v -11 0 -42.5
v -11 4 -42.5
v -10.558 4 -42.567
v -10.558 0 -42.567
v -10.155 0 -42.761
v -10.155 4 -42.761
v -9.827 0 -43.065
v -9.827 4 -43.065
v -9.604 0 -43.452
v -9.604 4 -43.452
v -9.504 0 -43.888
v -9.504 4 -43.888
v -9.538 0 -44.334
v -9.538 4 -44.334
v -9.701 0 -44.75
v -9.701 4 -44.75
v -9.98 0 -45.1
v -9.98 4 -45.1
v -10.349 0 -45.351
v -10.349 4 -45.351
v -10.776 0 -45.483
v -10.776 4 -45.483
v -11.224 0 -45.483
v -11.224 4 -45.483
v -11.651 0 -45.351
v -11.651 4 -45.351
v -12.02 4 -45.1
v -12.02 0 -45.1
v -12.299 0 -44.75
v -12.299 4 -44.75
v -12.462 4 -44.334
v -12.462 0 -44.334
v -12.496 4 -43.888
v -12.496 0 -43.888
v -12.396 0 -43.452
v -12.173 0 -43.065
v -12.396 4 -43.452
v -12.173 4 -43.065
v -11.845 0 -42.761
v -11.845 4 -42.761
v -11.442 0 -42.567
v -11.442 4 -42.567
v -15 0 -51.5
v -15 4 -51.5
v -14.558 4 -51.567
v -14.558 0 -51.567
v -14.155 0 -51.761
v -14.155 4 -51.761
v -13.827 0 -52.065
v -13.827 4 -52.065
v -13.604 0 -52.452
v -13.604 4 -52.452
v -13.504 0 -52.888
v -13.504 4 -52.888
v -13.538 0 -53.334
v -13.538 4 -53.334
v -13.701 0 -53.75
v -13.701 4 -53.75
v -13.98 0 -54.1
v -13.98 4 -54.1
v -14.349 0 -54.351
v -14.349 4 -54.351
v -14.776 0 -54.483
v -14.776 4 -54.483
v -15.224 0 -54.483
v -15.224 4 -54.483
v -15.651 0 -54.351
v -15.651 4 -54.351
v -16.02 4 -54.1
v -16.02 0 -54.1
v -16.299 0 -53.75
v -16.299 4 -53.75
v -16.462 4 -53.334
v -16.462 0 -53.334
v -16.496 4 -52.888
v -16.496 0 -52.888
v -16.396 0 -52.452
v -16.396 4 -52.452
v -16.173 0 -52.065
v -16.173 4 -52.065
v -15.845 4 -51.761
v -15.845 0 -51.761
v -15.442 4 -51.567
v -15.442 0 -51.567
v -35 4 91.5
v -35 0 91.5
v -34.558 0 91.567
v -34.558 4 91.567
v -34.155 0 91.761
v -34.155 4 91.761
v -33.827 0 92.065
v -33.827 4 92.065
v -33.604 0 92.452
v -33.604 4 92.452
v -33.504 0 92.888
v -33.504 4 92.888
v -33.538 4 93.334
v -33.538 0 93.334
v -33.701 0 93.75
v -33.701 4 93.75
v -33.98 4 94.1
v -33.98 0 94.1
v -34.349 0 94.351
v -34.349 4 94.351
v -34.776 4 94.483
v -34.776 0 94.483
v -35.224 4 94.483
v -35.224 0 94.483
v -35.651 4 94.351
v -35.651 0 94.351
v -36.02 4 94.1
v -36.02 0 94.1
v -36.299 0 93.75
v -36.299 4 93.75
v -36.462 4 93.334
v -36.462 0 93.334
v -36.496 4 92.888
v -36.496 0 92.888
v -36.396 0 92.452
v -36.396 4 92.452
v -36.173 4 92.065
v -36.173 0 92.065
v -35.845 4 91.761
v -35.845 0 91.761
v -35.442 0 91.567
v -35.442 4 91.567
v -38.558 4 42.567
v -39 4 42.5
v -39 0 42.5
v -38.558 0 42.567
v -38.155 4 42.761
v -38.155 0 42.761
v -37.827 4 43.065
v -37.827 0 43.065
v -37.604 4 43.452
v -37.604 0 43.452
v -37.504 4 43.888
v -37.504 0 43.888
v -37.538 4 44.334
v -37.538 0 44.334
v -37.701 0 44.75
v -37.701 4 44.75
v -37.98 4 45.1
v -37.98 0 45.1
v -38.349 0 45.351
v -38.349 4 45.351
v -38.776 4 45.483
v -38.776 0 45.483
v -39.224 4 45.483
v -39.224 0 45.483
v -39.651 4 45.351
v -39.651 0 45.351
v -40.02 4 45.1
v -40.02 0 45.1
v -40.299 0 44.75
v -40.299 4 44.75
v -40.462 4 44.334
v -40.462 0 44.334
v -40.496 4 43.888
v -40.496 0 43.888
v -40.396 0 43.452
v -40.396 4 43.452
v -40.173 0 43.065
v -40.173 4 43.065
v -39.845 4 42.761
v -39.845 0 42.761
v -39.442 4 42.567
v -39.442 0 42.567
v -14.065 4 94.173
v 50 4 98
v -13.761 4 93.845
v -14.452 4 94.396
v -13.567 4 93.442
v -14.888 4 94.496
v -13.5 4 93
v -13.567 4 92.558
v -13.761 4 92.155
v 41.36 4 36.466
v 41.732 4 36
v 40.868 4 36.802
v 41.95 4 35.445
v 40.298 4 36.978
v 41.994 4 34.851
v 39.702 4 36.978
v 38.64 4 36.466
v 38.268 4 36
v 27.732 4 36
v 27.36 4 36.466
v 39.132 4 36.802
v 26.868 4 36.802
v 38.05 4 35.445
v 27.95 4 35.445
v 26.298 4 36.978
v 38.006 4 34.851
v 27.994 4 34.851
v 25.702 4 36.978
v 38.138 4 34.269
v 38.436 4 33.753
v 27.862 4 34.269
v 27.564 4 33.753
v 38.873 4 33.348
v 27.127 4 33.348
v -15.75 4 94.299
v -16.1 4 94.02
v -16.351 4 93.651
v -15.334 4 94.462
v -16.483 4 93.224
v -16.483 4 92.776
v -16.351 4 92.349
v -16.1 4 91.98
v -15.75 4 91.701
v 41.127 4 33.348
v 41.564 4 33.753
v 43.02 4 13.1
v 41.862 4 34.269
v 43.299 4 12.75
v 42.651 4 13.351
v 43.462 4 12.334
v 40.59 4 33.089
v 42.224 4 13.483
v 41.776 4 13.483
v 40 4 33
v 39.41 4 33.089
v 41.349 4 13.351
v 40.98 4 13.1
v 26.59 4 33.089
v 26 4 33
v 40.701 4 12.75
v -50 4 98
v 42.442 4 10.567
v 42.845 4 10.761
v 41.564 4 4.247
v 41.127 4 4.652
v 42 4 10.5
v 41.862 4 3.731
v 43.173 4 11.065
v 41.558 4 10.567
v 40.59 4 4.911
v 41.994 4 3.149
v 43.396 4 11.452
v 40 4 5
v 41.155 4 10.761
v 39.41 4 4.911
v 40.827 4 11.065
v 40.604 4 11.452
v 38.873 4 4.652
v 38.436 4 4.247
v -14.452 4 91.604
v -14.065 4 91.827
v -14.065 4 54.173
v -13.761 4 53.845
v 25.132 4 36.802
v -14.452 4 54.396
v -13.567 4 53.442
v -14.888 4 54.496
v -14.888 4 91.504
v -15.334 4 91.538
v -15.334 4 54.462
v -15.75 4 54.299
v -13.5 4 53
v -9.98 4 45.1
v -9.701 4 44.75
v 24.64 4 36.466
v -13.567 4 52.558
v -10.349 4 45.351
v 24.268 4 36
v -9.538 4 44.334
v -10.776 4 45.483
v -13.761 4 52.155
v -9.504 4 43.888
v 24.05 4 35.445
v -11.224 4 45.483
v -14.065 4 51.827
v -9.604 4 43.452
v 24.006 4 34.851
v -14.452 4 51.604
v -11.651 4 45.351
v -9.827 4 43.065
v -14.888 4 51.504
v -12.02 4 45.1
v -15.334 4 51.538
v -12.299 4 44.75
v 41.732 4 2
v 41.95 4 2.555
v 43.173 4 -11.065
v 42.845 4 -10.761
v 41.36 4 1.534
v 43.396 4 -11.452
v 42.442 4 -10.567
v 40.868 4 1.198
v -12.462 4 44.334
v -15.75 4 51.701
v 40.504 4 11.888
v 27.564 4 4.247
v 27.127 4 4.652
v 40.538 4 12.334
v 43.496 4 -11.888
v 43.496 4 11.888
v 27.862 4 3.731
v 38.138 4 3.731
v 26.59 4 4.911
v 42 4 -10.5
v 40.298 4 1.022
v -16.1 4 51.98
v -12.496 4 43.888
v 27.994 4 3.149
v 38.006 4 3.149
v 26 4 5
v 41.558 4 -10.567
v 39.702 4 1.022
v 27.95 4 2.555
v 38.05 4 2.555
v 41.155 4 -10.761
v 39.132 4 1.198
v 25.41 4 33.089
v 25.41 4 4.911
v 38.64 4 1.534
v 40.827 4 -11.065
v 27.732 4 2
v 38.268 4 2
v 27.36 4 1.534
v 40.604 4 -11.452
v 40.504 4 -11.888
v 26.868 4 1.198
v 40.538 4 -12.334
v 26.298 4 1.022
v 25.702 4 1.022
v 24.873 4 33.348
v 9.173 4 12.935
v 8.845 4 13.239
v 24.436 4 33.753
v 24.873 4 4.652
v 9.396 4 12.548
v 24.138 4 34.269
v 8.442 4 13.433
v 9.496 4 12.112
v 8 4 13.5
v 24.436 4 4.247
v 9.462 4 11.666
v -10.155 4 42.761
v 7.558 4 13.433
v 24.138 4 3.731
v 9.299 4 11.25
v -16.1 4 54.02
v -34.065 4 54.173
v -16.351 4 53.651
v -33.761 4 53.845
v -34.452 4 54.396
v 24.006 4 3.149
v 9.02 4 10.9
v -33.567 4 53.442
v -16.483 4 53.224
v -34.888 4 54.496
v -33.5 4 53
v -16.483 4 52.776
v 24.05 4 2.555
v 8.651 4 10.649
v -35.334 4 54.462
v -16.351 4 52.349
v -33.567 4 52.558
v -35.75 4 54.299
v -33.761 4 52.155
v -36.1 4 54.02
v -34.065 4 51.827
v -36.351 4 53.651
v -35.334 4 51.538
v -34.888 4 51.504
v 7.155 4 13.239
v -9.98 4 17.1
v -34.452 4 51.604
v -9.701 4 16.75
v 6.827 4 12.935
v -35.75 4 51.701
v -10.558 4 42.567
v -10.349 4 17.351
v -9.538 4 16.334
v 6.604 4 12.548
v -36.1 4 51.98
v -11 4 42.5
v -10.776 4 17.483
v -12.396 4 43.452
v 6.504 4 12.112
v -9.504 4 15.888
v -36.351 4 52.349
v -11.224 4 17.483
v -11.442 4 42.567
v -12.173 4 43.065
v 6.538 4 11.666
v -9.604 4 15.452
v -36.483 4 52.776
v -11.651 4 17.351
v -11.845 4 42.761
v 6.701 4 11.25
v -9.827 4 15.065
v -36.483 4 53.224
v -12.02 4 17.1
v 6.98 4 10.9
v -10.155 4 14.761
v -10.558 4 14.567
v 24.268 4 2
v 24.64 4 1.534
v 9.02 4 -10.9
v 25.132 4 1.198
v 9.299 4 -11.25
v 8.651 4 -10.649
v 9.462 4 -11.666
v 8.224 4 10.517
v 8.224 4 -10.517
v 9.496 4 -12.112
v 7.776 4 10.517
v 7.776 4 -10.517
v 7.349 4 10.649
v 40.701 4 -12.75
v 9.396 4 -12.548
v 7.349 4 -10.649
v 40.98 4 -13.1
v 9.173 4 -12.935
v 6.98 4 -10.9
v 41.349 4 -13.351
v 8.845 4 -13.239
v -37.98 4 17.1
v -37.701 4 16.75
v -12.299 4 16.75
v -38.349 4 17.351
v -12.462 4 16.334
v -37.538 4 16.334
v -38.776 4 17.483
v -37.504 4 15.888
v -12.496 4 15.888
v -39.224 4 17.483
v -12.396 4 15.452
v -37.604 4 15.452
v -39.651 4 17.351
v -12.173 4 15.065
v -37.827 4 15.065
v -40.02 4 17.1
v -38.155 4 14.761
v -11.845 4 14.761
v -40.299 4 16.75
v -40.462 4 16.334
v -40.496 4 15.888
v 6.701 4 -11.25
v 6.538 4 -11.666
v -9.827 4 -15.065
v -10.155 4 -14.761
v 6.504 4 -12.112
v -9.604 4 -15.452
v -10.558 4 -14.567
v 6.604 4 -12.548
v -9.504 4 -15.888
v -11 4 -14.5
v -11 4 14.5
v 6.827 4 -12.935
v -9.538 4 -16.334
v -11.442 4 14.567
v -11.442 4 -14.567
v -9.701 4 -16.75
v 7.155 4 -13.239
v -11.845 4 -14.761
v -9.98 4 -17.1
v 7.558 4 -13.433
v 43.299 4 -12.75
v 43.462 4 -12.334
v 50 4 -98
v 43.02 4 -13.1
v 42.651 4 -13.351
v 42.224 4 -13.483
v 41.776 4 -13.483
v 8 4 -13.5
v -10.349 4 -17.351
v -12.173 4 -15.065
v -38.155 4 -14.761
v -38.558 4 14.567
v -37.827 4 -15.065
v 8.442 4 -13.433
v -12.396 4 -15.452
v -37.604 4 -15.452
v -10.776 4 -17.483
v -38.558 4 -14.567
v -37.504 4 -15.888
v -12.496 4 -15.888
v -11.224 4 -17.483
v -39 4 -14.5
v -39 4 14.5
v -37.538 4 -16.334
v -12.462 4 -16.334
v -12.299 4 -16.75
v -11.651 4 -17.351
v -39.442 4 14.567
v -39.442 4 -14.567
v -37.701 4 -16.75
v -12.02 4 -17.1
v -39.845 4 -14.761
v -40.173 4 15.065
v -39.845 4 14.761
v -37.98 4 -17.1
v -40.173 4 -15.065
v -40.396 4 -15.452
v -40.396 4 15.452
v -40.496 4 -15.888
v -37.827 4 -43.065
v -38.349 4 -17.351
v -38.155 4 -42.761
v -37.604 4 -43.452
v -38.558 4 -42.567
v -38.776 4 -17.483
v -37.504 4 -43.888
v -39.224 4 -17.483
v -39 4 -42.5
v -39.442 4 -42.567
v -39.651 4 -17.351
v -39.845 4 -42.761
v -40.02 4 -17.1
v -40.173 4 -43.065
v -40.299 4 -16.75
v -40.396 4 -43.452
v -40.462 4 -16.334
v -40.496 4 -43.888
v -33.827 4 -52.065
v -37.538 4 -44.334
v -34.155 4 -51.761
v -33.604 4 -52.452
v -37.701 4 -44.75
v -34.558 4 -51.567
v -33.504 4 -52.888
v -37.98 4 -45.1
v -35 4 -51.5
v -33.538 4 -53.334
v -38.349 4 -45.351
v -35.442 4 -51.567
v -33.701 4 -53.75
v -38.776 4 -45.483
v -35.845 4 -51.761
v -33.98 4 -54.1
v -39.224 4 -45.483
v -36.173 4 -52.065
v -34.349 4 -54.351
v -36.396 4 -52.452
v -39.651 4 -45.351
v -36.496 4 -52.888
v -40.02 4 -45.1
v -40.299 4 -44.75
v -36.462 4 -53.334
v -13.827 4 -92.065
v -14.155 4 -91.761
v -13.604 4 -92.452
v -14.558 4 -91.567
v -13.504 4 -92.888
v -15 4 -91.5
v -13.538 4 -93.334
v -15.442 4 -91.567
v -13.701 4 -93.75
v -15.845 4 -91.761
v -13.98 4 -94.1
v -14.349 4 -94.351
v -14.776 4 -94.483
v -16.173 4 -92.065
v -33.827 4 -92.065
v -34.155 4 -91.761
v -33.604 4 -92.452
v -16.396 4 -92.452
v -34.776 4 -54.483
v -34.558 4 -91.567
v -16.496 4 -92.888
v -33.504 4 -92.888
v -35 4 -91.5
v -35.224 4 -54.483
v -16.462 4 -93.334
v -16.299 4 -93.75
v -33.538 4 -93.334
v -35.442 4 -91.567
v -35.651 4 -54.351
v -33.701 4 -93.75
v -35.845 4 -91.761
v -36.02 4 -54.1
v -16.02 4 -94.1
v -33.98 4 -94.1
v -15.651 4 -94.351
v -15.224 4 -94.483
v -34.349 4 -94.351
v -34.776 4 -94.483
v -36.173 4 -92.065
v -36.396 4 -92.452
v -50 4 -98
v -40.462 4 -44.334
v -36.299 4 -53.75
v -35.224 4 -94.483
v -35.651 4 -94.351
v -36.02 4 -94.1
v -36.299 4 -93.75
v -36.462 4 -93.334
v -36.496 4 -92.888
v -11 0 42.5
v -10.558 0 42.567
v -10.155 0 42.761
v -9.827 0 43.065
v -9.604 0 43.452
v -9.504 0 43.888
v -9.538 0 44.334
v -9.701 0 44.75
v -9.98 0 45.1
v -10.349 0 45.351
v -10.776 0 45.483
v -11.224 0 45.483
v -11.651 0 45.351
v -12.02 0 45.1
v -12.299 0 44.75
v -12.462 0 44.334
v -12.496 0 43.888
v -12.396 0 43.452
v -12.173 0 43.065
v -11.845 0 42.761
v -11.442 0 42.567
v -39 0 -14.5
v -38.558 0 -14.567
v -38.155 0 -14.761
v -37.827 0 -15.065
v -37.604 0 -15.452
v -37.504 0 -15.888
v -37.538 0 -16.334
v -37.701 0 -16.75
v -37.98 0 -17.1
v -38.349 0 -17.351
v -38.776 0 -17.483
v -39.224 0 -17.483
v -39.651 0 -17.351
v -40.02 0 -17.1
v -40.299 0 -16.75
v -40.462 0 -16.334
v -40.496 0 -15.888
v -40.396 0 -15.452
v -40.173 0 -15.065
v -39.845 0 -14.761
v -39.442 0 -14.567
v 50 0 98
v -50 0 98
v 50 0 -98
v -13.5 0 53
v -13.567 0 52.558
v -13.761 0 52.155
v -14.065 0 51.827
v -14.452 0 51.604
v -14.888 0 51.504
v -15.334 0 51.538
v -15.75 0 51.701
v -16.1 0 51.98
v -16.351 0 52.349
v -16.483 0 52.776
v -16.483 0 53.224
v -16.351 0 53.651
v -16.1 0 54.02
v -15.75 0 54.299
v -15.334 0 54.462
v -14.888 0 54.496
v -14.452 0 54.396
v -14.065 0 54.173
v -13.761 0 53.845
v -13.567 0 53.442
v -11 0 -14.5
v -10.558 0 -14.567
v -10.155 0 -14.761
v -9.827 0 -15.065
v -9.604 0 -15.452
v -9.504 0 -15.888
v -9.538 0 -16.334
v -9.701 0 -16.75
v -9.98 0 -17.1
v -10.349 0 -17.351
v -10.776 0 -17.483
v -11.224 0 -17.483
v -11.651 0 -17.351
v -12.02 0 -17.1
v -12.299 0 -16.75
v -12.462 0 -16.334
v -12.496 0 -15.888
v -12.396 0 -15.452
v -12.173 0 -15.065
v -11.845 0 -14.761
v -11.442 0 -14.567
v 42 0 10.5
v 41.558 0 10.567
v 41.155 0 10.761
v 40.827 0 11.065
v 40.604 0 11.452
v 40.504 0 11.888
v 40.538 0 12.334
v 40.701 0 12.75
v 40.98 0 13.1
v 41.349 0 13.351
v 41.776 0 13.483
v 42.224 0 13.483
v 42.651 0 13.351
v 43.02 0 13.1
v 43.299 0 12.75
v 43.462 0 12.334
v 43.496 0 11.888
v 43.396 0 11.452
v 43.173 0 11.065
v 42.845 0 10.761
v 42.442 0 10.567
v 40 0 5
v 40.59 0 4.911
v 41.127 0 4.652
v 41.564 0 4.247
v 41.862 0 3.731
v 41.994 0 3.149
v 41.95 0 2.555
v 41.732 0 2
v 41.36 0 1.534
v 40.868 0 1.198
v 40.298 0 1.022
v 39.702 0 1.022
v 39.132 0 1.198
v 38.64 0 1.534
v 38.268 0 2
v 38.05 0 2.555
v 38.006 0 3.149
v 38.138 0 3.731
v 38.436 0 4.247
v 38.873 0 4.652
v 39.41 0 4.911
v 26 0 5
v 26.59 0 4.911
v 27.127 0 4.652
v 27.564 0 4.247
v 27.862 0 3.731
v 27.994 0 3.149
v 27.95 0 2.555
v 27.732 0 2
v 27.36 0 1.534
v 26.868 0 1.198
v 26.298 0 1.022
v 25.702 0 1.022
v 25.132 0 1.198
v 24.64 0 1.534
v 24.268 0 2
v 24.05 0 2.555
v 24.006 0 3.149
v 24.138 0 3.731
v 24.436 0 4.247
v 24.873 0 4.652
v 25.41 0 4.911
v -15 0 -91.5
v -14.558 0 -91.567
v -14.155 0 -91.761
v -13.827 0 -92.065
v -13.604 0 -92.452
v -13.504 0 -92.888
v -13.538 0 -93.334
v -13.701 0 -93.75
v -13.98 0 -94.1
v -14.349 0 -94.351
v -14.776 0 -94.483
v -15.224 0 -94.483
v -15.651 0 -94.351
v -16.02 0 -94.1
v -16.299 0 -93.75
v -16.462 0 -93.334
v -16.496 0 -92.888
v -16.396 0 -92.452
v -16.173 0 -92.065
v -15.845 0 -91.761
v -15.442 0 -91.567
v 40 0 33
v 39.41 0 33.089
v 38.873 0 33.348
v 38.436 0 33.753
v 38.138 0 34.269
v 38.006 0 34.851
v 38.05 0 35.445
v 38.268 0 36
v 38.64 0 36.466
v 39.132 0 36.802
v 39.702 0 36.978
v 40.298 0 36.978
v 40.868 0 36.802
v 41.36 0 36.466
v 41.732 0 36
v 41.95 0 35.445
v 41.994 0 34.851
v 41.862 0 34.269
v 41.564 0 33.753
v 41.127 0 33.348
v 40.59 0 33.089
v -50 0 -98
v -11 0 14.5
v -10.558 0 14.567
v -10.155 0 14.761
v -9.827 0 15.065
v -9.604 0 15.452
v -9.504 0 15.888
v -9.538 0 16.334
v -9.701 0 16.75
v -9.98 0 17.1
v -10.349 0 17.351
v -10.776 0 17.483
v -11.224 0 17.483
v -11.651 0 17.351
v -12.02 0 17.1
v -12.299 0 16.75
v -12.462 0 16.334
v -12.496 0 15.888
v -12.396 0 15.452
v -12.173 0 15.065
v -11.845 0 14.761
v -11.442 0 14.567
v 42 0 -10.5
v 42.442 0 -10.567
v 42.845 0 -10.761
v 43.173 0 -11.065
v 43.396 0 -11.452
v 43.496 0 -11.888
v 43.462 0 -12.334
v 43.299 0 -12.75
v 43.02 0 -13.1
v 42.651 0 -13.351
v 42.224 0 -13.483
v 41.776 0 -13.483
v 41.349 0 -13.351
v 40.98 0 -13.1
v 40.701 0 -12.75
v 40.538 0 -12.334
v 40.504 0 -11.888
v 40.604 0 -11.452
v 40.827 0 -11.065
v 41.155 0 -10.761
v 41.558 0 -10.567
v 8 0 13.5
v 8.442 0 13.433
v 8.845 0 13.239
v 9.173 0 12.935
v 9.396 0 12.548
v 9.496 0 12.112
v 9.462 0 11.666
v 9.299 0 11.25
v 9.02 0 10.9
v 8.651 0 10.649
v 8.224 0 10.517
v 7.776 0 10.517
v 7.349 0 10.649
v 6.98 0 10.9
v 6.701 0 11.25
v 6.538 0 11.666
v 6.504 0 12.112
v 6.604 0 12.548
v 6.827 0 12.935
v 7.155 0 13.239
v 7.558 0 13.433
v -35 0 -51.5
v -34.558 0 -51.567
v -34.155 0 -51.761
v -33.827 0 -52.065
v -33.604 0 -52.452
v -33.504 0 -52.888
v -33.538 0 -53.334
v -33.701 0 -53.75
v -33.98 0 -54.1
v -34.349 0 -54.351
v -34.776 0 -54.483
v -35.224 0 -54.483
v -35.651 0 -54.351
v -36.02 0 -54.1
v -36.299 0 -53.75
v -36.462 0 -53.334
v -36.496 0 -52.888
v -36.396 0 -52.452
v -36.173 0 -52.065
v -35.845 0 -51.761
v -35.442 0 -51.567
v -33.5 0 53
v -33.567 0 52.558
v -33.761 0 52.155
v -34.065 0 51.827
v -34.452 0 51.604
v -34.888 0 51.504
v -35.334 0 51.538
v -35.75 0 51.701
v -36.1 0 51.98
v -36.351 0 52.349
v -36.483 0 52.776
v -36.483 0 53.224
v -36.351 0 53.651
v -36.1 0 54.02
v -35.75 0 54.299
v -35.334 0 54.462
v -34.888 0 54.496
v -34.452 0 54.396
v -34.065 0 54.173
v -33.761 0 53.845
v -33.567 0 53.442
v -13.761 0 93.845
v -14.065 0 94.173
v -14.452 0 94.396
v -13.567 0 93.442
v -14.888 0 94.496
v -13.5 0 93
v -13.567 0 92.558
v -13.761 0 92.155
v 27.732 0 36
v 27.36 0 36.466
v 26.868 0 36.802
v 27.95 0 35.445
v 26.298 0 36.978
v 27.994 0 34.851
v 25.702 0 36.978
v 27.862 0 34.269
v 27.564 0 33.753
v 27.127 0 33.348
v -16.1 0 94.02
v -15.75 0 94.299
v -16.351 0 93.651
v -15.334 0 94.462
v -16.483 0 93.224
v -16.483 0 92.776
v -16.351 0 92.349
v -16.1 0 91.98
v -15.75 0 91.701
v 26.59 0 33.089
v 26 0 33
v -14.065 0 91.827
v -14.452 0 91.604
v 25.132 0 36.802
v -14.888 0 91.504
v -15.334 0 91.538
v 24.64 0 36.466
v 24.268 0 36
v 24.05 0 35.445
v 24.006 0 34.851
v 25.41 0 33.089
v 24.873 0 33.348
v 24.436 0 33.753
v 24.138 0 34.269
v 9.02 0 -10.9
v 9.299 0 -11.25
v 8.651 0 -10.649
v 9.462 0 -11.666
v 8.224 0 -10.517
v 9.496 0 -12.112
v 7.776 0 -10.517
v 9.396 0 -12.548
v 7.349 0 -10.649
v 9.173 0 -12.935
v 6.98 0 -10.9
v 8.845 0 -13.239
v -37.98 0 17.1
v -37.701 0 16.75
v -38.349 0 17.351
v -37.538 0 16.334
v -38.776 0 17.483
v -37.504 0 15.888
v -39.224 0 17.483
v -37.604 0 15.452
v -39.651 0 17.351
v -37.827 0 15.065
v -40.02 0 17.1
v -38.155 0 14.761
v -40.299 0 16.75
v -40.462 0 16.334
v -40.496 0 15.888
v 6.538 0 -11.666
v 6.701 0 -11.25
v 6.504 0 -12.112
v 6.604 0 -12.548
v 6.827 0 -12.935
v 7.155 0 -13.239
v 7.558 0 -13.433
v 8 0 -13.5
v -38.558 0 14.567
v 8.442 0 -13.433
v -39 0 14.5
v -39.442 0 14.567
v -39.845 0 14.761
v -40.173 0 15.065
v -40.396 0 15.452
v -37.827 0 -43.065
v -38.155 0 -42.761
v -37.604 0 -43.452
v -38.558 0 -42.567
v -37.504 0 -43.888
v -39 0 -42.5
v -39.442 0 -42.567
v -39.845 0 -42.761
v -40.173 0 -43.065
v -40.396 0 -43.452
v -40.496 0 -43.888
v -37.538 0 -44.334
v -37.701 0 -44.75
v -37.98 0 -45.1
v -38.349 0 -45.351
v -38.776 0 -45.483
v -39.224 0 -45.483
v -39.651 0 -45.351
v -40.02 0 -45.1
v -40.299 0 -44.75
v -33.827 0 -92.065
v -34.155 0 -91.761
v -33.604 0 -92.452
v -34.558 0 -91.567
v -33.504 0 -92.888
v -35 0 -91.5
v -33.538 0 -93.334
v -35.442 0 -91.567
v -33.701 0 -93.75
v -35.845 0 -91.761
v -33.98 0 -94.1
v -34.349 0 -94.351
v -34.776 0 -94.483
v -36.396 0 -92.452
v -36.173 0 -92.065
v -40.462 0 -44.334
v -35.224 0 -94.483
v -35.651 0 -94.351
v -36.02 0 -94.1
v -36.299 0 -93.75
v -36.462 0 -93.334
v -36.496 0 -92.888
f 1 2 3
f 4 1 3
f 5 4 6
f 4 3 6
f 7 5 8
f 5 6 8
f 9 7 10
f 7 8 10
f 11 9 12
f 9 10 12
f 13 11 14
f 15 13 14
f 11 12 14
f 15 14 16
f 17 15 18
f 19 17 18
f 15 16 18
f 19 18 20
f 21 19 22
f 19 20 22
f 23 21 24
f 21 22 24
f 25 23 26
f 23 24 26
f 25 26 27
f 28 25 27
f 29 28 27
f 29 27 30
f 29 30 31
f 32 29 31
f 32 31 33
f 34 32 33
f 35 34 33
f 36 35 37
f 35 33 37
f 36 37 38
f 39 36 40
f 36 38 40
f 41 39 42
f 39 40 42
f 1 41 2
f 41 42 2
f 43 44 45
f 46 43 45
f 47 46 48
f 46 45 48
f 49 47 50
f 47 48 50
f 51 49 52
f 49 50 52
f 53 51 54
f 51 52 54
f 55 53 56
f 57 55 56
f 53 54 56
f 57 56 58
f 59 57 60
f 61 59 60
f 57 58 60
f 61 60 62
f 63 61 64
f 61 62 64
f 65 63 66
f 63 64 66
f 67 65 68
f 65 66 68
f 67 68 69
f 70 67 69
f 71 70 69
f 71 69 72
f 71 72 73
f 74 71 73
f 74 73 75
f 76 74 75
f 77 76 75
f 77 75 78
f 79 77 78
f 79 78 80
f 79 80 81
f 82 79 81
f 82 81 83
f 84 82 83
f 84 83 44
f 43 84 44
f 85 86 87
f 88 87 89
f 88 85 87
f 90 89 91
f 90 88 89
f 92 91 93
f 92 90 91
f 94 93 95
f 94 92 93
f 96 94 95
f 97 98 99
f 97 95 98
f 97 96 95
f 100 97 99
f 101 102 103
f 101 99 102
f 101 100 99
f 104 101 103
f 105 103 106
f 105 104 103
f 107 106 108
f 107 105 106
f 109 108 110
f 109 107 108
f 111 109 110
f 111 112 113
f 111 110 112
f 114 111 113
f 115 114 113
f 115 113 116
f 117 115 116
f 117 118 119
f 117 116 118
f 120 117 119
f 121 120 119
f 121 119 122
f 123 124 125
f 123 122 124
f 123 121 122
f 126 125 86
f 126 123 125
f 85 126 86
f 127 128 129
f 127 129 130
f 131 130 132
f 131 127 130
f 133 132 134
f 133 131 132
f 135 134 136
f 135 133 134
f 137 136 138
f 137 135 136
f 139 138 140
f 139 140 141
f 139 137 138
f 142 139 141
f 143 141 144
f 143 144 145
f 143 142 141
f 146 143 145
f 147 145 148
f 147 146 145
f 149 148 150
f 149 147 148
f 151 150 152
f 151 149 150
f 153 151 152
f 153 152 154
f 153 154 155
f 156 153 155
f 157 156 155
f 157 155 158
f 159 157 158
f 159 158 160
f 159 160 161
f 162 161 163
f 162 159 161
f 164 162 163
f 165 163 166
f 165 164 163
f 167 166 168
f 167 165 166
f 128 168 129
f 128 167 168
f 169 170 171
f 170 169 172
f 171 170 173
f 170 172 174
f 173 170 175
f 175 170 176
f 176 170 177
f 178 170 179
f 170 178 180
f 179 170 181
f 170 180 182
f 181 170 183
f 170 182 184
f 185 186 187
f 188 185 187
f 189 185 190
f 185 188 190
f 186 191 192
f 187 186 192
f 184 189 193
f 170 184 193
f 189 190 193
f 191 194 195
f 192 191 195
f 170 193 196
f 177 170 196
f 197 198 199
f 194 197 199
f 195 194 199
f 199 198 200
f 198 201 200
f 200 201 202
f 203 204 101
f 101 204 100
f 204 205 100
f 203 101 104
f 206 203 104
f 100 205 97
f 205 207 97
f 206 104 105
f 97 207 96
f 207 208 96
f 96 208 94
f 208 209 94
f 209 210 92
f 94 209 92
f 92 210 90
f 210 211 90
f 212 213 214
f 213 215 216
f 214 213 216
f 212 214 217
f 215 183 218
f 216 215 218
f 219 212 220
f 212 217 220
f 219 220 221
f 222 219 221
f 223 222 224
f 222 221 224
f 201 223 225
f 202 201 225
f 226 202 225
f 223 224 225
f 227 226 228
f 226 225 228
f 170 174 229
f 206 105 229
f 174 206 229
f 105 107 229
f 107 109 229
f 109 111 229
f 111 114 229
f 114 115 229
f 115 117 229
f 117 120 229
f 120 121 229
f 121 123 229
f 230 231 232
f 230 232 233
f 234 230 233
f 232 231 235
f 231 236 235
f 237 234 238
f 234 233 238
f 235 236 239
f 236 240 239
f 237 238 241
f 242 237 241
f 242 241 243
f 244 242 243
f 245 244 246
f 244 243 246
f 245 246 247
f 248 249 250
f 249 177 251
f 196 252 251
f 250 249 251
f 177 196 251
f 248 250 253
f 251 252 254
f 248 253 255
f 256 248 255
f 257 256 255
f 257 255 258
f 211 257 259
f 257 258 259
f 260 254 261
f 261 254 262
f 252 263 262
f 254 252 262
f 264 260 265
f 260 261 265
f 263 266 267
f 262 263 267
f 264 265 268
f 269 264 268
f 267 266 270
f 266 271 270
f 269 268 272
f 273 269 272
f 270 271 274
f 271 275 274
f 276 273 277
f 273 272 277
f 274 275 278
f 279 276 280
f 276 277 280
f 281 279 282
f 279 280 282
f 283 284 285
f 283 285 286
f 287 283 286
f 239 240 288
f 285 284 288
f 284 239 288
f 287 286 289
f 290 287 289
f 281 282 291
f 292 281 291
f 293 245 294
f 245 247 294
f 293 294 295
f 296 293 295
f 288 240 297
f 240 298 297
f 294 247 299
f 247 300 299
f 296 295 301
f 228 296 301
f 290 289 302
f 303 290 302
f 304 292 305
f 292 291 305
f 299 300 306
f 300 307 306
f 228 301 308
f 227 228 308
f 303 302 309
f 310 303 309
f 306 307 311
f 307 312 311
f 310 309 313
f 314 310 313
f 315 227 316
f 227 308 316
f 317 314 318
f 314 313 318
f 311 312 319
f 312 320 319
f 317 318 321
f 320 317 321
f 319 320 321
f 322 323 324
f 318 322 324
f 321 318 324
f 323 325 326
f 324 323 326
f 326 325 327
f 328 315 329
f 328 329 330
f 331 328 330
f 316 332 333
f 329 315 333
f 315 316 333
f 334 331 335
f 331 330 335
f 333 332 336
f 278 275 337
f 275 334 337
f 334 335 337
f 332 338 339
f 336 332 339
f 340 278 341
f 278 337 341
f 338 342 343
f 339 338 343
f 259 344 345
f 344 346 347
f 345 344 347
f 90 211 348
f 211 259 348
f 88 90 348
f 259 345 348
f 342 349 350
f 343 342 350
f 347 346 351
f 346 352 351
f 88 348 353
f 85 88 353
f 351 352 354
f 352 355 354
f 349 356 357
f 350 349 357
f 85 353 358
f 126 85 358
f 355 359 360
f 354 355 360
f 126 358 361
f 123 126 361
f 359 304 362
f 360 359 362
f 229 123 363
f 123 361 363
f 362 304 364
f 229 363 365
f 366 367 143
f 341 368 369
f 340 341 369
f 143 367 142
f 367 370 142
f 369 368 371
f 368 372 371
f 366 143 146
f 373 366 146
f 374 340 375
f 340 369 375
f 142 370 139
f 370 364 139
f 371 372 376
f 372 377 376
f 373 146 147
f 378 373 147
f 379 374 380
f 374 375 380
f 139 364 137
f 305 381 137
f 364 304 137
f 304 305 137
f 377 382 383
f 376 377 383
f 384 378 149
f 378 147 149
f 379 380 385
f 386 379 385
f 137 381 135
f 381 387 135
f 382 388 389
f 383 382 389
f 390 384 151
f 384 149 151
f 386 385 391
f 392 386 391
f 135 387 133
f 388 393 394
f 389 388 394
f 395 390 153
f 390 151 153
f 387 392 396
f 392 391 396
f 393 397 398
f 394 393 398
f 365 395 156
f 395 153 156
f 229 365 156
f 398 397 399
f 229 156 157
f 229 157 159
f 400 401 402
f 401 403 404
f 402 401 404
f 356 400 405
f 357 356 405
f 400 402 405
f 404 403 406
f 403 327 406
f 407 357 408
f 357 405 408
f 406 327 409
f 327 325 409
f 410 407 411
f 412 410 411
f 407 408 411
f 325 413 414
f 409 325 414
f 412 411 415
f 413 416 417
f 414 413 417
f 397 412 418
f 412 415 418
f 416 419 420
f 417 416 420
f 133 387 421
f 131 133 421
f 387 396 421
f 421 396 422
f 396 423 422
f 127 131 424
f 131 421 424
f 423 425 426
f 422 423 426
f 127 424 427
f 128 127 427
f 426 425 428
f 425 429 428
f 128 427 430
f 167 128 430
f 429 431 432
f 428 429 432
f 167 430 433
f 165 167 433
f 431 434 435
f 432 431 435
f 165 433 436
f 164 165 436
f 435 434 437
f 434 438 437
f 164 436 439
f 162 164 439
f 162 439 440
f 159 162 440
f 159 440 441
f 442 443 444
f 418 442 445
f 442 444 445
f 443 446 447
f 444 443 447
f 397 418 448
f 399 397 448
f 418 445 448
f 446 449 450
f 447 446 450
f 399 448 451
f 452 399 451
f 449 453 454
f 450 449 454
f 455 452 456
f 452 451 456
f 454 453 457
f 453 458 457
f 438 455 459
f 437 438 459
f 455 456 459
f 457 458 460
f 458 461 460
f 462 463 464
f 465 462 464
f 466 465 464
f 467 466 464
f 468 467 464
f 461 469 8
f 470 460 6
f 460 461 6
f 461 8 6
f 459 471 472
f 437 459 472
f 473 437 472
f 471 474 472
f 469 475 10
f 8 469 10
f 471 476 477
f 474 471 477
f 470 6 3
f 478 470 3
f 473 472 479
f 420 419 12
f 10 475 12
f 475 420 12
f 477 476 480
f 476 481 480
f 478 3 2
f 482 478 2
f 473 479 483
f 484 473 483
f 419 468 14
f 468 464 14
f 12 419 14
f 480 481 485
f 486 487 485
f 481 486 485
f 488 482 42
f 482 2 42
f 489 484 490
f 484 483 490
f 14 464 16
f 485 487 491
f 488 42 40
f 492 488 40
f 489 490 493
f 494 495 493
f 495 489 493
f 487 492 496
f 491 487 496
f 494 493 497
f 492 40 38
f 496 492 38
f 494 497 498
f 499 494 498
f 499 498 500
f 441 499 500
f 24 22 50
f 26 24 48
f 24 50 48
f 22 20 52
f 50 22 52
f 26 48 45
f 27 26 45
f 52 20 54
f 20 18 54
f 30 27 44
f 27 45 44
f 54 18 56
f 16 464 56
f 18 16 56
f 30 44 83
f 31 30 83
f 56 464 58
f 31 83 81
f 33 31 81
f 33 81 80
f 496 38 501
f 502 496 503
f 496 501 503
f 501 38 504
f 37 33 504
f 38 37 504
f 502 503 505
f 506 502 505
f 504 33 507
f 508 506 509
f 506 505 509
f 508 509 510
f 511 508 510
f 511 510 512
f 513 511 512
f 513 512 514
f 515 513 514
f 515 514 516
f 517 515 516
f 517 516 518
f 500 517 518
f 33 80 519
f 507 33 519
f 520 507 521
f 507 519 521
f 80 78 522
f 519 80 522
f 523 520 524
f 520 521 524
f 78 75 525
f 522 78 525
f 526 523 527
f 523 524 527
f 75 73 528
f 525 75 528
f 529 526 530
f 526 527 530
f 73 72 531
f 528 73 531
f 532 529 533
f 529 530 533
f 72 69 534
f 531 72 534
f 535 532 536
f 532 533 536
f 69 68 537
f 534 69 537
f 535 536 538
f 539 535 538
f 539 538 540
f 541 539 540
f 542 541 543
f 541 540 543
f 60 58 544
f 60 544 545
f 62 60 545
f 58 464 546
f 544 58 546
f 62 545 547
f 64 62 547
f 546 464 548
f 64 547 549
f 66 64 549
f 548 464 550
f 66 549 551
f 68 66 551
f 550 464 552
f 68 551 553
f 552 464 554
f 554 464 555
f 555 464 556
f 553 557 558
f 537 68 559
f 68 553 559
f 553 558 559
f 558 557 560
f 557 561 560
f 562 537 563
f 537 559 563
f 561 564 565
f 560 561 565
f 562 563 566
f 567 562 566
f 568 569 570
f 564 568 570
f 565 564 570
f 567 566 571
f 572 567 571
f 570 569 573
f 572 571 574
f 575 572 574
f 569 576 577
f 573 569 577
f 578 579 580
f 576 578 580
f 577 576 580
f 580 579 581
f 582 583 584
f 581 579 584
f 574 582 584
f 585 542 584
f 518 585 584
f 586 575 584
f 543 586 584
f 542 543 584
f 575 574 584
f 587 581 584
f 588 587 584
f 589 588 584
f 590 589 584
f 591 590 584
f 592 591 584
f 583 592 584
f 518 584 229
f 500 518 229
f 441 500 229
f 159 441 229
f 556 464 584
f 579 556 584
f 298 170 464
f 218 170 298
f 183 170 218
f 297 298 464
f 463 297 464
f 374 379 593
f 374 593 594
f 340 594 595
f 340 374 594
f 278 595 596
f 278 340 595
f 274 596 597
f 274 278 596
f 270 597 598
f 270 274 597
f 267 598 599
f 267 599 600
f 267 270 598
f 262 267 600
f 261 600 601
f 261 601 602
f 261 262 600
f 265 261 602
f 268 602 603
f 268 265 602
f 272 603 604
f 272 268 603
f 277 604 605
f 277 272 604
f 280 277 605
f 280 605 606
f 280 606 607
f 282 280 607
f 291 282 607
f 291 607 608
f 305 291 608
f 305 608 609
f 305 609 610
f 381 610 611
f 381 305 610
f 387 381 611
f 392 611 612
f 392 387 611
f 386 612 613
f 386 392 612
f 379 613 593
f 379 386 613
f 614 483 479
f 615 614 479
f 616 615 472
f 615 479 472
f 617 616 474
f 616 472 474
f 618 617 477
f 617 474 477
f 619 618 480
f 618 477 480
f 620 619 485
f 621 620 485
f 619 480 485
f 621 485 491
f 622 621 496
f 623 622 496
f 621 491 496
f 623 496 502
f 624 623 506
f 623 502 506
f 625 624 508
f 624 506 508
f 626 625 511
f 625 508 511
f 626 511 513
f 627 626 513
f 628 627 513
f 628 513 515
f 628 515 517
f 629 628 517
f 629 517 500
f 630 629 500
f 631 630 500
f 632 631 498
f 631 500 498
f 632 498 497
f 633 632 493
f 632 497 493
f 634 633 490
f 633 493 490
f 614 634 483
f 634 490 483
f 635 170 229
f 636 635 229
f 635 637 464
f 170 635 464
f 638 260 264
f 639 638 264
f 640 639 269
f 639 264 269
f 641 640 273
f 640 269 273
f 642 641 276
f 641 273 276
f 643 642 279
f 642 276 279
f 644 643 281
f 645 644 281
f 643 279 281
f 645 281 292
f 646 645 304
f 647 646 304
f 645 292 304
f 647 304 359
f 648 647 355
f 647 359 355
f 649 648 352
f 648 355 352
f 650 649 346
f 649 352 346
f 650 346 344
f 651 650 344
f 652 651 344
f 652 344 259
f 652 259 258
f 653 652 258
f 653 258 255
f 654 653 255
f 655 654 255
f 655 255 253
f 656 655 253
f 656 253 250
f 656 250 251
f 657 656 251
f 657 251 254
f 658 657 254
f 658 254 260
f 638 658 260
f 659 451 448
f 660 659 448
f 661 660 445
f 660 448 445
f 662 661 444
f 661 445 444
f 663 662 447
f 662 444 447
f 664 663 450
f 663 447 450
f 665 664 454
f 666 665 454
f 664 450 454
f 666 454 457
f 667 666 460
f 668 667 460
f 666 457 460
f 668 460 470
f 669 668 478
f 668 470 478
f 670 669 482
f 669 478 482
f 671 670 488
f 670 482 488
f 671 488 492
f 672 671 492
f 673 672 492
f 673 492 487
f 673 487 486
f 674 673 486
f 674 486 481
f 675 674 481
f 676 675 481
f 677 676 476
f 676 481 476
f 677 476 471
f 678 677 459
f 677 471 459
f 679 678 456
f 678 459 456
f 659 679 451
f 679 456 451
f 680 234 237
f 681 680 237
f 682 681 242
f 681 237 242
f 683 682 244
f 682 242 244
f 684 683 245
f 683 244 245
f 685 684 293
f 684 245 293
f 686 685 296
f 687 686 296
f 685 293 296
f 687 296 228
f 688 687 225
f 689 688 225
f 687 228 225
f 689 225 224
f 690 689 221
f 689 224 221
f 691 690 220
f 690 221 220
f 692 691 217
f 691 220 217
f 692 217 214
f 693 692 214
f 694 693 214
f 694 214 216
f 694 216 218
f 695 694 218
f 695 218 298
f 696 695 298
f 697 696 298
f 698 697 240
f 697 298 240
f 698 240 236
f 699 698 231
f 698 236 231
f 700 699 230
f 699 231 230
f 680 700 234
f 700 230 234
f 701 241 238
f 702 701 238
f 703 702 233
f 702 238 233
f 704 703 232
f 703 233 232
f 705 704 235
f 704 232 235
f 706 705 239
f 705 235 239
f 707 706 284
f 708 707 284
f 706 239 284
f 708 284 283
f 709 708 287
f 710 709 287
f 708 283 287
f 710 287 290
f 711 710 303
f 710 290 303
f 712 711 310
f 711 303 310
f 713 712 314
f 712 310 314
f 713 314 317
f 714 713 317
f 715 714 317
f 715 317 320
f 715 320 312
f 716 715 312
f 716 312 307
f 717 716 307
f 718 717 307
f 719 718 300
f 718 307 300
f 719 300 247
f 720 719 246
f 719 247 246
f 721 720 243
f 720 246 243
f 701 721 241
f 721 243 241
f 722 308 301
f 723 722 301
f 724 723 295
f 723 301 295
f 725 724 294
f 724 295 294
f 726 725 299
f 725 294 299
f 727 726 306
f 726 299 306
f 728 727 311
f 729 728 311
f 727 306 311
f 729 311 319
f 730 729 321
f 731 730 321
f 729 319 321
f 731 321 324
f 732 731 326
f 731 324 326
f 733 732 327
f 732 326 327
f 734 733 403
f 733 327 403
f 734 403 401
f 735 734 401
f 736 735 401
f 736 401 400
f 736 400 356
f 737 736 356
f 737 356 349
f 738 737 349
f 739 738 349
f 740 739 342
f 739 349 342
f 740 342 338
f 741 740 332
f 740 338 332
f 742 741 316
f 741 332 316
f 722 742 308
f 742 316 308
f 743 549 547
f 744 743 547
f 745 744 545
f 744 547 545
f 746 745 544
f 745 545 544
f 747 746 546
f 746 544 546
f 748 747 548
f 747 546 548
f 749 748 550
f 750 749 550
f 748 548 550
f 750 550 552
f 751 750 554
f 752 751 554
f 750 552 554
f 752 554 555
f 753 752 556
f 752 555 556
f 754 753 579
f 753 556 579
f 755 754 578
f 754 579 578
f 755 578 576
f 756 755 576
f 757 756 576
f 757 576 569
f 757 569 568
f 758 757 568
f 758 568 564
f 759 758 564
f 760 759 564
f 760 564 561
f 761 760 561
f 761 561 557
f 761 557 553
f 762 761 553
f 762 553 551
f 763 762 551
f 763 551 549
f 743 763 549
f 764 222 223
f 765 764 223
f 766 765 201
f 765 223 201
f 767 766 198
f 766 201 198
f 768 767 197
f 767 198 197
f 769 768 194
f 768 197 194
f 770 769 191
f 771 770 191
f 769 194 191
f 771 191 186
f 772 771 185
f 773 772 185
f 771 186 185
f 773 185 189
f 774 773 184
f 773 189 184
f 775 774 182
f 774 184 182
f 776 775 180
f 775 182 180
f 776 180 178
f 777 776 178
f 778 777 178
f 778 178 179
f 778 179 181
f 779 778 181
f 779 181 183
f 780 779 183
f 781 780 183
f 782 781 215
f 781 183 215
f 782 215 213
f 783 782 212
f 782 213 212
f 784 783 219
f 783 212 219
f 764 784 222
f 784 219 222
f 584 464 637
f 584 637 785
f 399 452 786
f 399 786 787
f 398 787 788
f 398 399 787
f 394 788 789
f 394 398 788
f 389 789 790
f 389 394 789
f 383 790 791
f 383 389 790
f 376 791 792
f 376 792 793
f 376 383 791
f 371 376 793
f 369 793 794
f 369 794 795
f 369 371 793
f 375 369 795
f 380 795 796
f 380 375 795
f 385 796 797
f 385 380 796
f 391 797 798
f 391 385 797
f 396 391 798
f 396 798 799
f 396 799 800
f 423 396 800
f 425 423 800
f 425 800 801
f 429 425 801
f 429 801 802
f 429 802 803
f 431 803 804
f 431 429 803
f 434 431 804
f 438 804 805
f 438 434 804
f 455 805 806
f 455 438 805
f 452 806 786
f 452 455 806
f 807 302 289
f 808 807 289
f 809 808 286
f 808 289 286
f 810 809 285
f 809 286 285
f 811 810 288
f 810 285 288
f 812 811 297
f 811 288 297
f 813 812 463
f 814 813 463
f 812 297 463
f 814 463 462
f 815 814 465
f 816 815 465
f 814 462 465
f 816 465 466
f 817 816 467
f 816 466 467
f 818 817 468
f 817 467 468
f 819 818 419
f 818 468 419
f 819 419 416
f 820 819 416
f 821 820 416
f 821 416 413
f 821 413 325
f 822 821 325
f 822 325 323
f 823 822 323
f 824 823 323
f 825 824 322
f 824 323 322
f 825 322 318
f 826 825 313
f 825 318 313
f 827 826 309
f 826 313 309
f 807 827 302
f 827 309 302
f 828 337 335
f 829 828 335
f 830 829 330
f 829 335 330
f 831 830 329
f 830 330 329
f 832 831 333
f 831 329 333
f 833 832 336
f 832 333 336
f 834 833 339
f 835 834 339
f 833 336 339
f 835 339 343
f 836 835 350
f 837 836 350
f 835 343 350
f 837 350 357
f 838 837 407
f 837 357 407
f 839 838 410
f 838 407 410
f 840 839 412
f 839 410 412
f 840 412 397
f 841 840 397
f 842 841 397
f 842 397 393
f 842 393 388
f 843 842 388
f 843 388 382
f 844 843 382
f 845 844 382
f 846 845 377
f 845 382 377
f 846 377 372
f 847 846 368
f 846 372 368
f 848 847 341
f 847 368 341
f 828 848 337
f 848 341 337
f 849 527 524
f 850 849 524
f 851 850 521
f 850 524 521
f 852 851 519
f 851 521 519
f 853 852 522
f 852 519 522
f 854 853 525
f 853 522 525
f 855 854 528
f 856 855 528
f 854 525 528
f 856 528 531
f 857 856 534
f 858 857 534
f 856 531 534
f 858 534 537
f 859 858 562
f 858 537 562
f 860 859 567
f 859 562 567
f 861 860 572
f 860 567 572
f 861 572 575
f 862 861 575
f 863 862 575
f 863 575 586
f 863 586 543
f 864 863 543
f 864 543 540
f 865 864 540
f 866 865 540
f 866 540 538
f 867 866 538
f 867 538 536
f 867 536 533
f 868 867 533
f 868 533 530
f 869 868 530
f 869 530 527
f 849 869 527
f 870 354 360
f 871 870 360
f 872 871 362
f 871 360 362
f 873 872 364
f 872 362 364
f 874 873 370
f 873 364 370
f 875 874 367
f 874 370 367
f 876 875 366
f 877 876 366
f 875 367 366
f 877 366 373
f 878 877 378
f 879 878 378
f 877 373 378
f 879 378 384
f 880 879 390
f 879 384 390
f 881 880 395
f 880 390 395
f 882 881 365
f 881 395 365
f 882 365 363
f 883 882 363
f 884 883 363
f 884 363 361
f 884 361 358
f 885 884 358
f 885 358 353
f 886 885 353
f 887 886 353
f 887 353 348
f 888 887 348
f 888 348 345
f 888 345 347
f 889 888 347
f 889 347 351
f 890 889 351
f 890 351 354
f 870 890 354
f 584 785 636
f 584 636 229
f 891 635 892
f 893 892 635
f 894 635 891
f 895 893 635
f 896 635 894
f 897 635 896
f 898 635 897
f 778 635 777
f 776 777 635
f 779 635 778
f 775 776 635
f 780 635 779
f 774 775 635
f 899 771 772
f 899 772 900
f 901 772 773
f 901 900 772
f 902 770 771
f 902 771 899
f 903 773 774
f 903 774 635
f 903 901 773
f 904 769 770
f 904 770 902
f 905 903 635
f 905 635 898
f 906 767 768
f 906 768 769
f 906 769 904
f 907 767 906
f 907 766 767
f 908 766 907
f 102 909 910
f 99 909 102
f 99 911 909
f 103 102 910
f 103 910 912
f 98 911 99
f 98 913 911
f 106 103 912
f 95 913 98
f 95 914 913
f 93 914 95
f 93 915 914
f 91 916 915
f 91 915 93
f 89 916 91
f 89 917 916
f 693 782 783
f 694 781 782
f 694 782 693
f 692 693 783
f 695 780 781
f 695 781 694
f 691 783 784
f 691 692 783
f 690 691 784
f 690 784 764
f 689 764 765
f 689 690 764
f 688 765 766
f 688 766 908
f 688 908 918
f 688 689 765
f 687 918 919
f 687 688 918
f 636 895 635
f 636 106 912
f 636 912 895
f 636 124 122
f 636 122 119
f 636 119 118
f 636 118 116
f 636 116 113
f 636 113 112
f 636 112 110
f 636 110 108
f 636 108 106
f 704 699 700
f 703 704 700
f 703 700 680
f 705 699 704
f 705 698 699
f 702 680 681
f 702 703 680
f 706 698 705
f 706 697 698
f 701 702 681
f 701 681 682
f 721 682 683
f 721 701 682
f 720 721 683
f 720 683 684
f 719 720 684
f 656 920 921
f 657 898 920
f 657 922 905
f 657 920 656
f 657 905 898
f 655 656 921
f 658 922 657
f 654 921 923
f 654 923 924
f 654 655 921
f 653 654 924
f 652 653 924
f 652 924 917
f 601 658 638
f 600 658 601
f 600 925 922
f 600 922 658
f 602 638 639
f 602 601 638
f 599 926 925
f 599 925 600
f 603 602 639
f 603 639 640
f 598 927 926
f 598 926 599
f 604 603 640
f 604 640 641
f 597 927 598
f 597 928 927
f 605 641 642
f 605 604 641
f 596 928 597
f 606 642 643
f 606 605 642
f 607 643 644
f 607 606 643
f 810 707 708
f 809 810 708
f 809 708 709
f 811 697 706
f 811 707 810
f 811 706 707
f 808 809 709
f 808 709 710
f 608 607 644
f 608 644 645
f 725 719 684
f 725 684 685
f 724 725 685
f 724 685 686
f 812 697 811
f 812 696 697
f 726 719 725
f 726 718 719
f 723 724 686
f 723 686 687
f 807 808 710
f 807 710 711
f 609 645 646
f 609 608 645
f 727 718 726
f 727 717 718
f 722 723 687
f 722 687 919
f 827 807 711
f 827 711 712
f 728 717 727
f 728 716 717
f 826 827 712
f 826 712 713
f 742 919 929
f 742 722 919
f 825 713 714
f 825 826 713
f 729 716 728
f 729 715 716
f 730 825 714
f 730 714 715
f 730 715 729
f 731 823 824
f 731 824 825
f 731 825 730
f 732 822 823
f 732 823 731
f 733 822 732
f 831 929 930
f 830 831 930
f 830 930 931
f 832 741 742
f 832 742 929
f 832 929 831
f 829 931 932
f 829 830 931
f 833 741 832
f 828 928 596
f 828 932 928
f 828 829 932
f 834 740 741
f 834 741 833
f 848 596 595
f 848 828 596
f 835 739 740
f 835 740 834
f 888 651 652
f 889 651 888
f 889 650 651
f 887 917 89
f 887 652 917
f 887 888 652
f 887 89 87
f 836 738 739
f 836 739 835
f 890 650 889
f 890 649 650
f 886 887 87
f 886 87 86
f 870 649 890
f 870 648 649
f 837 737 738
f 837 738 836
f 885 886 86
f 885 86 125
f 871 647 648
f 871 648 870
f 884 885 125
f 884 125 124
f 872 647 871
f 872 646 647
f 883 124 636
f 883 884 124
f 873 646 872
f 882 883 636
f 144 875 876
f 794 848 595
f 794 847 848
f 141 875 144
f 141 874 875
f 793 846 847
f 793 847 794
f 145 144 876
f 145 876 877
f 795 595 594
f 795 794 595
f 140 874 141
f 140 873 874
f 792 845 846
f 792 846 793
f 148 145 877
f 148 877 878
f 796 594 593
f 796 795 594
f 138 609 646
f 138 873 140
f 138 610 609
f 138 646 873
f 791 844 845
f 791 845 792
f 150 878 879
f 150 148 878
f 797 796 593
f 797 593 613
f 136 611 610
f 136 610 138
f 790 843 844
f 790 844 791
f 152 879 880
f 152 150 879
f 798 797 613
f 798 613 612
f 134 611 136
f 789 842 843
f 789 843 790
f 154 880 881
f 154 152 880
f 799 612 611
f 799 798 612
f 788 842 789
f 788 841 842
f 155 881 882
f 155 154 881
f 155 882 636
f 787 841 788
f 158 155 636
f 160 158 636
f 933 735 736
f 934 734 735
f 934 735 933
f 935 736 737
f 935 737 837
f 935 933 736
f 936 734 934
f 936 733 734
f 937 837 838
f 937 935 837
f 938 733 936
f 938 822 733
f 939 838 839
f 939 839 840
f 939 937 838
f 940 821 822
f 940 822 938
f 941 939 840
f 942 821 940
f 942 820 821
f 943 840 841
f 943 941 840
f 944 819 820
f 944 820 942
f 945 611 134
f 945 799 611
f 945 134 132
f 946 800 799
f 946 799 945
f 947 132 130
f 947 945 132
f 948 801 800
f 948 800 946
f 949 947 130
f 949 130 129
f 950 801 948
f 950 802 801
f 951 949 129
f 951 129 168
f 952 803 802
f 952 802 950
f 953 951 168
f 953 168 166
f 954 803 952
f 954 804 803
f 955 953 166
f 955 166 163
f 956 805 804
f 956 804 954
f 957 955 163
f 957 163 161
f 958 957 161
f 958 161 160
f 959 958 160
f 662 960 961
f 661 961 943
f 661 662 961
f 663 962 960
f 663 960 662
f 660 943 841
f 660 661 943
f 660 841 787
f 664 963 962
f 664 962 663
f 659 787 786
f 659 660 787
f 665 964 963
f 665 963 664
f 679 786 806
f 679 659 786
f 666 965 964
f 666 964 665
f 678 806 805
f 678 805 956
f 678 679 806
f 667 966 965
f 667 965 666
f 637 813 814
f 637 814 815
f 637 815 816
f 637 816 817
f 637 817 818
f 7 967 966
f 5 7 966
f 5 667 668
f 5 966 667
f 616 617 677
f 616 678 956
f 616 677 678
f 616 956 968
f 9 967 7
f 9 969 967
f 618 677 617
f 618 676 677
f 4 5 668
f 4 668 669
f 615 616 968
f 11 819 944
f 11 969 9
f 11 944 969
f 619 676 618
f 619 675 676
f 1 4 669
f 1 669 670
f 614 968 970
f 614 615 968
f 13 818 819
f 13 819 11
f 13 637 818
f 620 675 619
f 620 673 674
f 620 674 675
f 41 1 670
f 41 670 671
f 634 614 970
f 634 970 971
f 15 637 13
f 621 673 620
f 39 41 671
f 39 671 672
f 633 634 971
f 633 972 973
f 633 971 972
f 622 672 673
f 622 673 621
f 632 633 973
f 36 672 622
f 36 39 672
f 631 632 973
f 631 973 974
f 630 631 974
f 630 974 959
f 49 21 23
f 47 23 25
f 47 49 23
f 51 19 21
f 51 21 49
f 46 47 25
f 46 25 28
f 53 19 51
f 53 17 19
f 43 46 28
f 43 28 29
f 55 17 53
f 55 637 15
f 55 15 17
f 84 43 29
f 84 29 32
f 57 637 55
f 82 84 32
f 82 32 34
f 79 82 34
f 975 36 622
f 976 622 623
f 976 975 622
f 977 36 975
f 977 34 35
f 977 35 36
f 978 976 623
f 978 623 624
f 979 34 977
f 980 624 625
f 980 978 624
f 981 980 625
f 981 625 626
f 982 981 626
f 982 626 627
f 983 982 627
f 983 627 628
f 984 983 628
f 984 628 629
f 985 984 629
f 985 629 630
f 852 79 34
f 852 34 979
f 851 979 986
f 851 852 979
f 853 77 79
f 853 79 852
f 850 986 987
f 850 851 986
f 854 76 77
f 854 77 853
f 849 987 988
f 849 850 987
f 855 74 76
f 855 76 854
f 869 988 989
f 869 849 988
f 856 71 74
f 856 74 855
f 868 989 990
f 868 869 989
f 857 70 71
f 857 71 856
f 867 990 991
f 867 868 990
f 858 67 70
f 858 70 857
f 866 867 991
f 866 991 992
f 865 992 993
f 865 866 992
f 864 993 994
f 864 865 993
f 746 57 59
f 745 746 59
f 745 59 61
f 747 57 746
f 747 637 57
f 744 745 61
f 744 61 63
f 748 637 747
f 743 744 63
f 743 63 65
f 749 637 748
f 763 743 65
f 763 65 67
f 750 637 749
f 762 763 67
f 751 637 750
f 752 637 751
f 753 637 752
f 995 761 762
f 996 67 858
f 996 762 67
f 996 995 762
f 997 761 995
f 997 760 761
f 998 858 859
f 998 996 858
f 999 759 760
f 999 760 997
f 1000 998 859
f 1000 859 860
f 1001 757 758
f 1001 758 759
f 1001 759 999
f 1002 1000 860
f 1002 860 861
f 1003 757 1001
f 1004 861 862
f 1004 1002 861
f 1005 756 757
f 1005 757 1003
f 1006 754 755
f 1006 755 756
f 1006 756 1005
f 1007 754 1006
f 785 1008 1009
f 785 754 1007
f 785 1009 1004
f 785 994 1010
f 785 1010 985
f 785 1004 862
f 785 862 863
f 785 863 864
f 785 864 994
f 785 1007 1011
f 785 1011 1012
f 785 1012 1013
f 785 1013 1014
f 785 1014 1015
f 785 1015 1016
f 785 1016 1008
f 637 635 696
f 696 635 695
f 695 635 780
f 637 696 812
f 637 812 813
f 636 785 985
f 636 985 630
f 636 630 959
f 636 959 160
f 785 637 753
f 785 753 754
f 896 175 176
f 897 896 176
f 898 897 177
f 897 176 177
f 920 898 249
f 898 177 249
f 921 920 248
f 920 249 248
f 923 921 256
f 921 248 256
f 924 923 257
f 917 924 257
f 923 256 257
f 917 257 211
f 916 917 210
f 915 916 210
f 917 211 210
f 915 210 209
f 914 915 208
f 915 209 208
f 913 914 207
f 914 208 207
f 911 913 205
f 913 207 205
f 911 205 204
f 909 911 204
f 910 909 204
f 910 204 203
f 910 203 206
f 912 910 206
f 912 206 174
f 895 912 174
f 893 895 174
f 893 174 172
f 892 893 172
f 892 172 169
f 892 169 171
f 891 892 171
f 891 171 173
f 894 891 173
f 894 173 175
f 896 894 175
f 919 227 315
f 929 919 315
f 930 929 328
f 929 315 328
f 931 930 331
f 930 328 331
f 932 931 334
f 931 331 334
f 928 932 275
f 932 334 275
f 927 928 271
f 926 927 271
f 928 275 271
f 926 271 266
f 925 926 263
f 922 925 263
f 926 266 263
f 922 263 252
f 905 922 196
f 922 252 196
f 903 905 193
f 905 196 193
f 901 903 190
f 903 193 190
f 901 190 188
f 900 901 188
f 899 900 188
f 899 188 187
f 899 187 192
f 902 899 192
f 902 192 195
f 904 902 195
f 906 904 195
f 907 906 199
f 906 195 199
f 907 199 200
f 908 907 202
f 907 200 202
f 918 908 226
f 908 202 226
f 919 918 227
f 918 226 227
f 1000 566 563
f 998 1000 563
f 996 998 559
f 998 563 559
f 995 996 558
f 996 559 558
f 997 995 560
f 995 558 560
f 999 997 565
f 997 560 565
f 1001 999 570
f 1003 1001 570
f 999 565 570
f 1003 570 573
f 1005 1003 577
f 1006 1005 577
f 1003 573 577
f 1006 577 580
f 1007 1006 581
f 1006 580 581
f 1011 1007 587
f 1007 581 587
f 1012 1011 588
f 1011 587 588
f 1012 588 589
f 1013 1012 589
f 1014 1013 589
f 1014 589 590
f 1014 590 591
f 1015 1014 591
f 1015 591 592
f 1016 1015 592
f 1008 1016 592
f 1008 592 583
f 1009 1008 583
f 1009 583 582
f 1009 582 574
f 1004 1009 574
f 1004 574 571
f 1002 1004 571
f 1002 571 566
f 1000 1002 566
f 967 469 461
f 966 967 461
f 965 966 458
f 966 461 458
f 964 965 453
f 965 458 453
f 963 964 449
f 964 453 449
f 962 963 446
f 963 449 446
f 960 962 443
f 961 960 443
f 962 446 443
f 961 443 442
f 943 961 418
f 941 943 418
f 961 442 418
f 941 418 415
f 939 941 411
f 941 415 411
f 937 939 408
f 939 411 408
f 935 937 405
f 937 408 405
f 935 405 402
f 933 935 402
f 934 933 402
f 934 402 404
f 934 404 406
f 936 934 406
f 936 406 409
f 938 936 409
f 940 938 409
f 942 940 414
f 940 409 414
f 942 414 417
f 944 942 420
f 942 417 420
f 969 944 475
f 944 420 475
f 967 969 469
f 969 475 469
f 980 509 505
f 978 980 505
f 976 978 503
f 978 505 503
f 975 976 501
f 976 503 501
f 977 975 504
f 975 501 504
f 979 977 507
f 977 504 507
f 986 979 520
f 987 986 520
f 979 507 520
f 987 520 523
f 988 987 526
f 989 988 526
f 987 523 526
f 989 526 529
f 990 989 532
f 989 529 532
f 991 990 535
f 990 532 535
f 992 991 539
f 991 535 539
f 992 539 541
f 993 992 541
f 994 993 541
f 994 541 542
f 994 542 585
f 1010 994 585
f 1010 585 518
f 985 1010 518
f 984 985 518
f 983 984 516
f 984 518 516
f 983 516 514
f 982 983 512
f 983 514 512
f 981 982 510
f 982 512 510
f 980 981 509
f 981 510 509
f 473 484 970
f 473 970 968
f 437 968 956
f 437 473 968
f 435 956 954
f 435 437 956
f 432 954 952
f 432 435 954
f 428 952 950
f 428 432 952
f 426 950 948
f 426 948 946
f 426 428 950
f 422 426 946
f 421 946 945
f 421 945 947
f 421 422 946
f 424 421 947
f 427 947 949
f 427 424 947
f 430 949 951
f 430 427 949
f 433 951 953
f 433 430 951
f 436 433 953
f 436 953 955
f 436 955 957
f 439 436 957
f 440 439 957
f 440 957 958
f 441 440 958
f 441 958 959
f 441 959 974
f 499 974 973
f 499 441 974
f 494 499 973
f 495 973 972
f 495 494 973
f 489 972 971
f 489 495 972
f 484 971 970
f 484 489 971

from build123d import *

# Parameters (mm, degrees)
SKETCH_1_W                  = 100
SKETCH_1_H                  = 160
EXTRUDE_1_DEPTH             = 4
SKETCH_2_R                  = 2
CUT_EXTRUDE_1_DEPTH         = 4
SKETCH_3_R                  = 1.5
CUT_EXTRUDE_2_DEPTH         = 4
SKETCH_4_R                  = 1.5
CUT_EXTRUDE_3_DEPTH         = 4
SKETCH_6_W                  = 100
SKETCH_6_H                  = 4
EXTRUDE_2_DEPTH             = 18
SKETCH_5_R                  = 1.5
CUT_EXTRUDE_4_DEPTH         = 10
PATTERN_LINEAR_1_COUNT      = 2
PATTERN_LINEAR_1_PITCH      = 40
PATTERN_LINEAR_1_COUNT_DIR2 = 2
PATTERN_LINEAR_1_PITCH_DIR2 = 20
MIRROR_3_COPY_1_SKETCH_R    = 1.5
MIRROR_3_COPY_1_DEPTH       = 10
MIRROR_3_COPY_2_SKETCH_R    = 1.5
MIRROR_3_COPY_2_DEPTH       = 10
MIRROR_3_COPY_3_SKETCH_R    = 1.5
MIRROR_3_COPY_3_DEPTH       = 10


with BuildPart() as part:
    # 草图1 → 凸台-拉伸1 (new body)
    with BuildSketch(Plane(origin=(0, 0, 0), x_dir=(1, 0, 0), z_dir=(0, 1, 0))):
        Rectangle(SKETCH_1_W, SKETCH_1_H)
    extrude(amount=EXTRUDE_1_DEPTH)

    # 草图2 → 切除-拉伸1 (cut)
    with BuildSketch(Plane(origin=(0, 4, 0), x_dir=(1, 0, 0), z_dir=(0, 1, 0))):
        with Locations(Location((40, -3, 0), (0, 0, 270))):
            Circle(SKETCH_2_R)
        with Locations(Location((26, -3, 0), (0, 0, 270))):
            Circle(SKETCH_2_R)
        with Locations(Location((40, -35, 0), (0, 0, 90))):
            Circle(SKETCH_2_R)
        with Locations(Location((26, -35, 0), (0, 0, 90))):
            Circle(SKETCH_2_R)
    extrude(amount=-CUT_EXTRUDE_1_DEPTH, mode=Mode.SUBTRACT)

    # 草图3 → 切除-拉伸2 (cut)
    with BuildSketch(Plane(origin=(0, 4, 0), x_dir=(1, 0, 0), z_dir=(0, 1, 0))):
        with Locations(Location((-39, 44, 0), (0, 0, 270))):
            Circle(SKETCH_3_R)
        with Locations(Location((-11, 44, 0), (0, 0, 270))):
            Circle(SKETCH_3_R)
        with Locations(Location((-11, 16, 0), (0, 0, 270))):
            Circle(SKETCH_3_R)
        with Locations(Location((-39, 16, 0), (0, 0, 270))):
            Circle(SKETCH_3_R)
    cut_extrude_2 = extrude(amount=-CUT_EXTRUDE_2_DEPTH, mode=Mode.SUBTRACT)

    # 镜向1: 切除-拉伸2 across plane
    add(cut_extrude_2.mirror(Plane.XY), mode=Mode.SUBTRACT)

    # 草图4 → 切除-拉伸3 (cut)
    with BuildSketch(Plane(origin=(0, 4, 0), x_dir=(1, 0, 0), z_dir=(0, 1, 0))):
        with Locations(Location((42, 12, 0), (0, 0, 270))):
            Circle(SKETCH_4_R)
        with Locations(Location((8, 12, 0), (0, 0, 90))):
            Circle(SKETCH_4_R)
        with Locations(Location((42, -12, 0), (0, 0, 90))):
            Circle(SKETCH_4_R)
        with Locations(Location((8, -12, 0), (0, 0, 270))):
            Circle(SKETCH_4_R)
    extrude(amount=-CUT_EXTRUDE_3_DEPTH, mode=Mode.SUBTRACT)

    # 草图6 → 凸台-拉伸2 (add)
    with BuildSketch(Plane(origin=(0, 0, -80), x_dir=(-1, 0, 0), z_dir=(0, 0, -1))):
        with Locations((0, 2)):
            Rectangle(SKETCH_6_W, SKETCH_6_H)
    extrude_2 = extrude(amount=EXTRUDE_2_DEPTH)

    # 草图5 → 切除-拉伸4 (cut)
    with BuildSketch(Plane(origin=(0, 4, 0), x_dir=(1, 0, 0), z_dir=(0, 1, 0))):
        with Locations(Location((-35, 93, 0), (0, 0, 270))):
            Circle(SKETCH_5_R)
    cut_extrude_4 = extrude(amount=-CUT_EXTRUDE_4_DEPTH, mode=Mode.SUBTRACT)

    # 镜向2: 凸台-拉伸2 across plane
    add(extrude_2.mirror(Plane.XY))

    # 阵列(线性)1: Cut-Extrude 4 2 × 2
    with Locations(*[(j * PATTERN_LINEAR_1_PITCH_DIR2, 0, i * PATTERN_LINEAR_1_PITCH) for i in range(PATTERN_LINEAR_1_COUNT) for j in range(PATTERN_LINEAR_1_COUNT_DIR2) if (i, j) != (0, 0)]):
        add(cut_extrude_4, mode=Mode.SUBTRACT)

    # 镜向3: 切除-拉伸4 across plane
    add(cut_extrude_4.mirror(Plane.XY), mode=Mode.SUBTRACT)

    # 镜向3 copy 1 sketch → 镜向3 copy 1 (cut)
    with BuildSketch(Plane(origin=(20, 4, 0), x_dir=(1, 0, 0), z_dir=(0, 1, 0))):
        with Locations((-35, -93)):
            Circle(MIRROR_3_COPY_1_SKETCH_R)
    extrude(amount=-MIRROR_3_COPY_1_DEPTH, mode=Mode.SUBTRACT)

    # 镜向3 copy 2 sketch → 镜向3 copy 2 (cut)
    with BuildSketch(Plane(origin=(0, 4, -40), x_dir=(1, 0, 0), z_dir=(0, 1, 0))):
        with Locations((-35, -93)):
            Circle(MIRROR_3_COPY_2_SKETCH_R)
    extrude(amount=-MIRROR_3_COPY_2_DEPTH, mode=Mode.SUBTRACT)

    # 镜向3 copy 3 sketch → 镜向3 copy 3 (cut)
    with BuildSketch(Plane(origin=(20, 4, -40), x_dir=(1, 0, 0), z_dir=(0, 1, 0))):
        with Locations((-35, -93)):
            Circle(MIRROR_3_COPY_3_SKETCH_R)
    extrude(amount=-MIRROR_3_COPY_3_DEPTH, mode=Mode.SUBTRACT)


solid = part.part
